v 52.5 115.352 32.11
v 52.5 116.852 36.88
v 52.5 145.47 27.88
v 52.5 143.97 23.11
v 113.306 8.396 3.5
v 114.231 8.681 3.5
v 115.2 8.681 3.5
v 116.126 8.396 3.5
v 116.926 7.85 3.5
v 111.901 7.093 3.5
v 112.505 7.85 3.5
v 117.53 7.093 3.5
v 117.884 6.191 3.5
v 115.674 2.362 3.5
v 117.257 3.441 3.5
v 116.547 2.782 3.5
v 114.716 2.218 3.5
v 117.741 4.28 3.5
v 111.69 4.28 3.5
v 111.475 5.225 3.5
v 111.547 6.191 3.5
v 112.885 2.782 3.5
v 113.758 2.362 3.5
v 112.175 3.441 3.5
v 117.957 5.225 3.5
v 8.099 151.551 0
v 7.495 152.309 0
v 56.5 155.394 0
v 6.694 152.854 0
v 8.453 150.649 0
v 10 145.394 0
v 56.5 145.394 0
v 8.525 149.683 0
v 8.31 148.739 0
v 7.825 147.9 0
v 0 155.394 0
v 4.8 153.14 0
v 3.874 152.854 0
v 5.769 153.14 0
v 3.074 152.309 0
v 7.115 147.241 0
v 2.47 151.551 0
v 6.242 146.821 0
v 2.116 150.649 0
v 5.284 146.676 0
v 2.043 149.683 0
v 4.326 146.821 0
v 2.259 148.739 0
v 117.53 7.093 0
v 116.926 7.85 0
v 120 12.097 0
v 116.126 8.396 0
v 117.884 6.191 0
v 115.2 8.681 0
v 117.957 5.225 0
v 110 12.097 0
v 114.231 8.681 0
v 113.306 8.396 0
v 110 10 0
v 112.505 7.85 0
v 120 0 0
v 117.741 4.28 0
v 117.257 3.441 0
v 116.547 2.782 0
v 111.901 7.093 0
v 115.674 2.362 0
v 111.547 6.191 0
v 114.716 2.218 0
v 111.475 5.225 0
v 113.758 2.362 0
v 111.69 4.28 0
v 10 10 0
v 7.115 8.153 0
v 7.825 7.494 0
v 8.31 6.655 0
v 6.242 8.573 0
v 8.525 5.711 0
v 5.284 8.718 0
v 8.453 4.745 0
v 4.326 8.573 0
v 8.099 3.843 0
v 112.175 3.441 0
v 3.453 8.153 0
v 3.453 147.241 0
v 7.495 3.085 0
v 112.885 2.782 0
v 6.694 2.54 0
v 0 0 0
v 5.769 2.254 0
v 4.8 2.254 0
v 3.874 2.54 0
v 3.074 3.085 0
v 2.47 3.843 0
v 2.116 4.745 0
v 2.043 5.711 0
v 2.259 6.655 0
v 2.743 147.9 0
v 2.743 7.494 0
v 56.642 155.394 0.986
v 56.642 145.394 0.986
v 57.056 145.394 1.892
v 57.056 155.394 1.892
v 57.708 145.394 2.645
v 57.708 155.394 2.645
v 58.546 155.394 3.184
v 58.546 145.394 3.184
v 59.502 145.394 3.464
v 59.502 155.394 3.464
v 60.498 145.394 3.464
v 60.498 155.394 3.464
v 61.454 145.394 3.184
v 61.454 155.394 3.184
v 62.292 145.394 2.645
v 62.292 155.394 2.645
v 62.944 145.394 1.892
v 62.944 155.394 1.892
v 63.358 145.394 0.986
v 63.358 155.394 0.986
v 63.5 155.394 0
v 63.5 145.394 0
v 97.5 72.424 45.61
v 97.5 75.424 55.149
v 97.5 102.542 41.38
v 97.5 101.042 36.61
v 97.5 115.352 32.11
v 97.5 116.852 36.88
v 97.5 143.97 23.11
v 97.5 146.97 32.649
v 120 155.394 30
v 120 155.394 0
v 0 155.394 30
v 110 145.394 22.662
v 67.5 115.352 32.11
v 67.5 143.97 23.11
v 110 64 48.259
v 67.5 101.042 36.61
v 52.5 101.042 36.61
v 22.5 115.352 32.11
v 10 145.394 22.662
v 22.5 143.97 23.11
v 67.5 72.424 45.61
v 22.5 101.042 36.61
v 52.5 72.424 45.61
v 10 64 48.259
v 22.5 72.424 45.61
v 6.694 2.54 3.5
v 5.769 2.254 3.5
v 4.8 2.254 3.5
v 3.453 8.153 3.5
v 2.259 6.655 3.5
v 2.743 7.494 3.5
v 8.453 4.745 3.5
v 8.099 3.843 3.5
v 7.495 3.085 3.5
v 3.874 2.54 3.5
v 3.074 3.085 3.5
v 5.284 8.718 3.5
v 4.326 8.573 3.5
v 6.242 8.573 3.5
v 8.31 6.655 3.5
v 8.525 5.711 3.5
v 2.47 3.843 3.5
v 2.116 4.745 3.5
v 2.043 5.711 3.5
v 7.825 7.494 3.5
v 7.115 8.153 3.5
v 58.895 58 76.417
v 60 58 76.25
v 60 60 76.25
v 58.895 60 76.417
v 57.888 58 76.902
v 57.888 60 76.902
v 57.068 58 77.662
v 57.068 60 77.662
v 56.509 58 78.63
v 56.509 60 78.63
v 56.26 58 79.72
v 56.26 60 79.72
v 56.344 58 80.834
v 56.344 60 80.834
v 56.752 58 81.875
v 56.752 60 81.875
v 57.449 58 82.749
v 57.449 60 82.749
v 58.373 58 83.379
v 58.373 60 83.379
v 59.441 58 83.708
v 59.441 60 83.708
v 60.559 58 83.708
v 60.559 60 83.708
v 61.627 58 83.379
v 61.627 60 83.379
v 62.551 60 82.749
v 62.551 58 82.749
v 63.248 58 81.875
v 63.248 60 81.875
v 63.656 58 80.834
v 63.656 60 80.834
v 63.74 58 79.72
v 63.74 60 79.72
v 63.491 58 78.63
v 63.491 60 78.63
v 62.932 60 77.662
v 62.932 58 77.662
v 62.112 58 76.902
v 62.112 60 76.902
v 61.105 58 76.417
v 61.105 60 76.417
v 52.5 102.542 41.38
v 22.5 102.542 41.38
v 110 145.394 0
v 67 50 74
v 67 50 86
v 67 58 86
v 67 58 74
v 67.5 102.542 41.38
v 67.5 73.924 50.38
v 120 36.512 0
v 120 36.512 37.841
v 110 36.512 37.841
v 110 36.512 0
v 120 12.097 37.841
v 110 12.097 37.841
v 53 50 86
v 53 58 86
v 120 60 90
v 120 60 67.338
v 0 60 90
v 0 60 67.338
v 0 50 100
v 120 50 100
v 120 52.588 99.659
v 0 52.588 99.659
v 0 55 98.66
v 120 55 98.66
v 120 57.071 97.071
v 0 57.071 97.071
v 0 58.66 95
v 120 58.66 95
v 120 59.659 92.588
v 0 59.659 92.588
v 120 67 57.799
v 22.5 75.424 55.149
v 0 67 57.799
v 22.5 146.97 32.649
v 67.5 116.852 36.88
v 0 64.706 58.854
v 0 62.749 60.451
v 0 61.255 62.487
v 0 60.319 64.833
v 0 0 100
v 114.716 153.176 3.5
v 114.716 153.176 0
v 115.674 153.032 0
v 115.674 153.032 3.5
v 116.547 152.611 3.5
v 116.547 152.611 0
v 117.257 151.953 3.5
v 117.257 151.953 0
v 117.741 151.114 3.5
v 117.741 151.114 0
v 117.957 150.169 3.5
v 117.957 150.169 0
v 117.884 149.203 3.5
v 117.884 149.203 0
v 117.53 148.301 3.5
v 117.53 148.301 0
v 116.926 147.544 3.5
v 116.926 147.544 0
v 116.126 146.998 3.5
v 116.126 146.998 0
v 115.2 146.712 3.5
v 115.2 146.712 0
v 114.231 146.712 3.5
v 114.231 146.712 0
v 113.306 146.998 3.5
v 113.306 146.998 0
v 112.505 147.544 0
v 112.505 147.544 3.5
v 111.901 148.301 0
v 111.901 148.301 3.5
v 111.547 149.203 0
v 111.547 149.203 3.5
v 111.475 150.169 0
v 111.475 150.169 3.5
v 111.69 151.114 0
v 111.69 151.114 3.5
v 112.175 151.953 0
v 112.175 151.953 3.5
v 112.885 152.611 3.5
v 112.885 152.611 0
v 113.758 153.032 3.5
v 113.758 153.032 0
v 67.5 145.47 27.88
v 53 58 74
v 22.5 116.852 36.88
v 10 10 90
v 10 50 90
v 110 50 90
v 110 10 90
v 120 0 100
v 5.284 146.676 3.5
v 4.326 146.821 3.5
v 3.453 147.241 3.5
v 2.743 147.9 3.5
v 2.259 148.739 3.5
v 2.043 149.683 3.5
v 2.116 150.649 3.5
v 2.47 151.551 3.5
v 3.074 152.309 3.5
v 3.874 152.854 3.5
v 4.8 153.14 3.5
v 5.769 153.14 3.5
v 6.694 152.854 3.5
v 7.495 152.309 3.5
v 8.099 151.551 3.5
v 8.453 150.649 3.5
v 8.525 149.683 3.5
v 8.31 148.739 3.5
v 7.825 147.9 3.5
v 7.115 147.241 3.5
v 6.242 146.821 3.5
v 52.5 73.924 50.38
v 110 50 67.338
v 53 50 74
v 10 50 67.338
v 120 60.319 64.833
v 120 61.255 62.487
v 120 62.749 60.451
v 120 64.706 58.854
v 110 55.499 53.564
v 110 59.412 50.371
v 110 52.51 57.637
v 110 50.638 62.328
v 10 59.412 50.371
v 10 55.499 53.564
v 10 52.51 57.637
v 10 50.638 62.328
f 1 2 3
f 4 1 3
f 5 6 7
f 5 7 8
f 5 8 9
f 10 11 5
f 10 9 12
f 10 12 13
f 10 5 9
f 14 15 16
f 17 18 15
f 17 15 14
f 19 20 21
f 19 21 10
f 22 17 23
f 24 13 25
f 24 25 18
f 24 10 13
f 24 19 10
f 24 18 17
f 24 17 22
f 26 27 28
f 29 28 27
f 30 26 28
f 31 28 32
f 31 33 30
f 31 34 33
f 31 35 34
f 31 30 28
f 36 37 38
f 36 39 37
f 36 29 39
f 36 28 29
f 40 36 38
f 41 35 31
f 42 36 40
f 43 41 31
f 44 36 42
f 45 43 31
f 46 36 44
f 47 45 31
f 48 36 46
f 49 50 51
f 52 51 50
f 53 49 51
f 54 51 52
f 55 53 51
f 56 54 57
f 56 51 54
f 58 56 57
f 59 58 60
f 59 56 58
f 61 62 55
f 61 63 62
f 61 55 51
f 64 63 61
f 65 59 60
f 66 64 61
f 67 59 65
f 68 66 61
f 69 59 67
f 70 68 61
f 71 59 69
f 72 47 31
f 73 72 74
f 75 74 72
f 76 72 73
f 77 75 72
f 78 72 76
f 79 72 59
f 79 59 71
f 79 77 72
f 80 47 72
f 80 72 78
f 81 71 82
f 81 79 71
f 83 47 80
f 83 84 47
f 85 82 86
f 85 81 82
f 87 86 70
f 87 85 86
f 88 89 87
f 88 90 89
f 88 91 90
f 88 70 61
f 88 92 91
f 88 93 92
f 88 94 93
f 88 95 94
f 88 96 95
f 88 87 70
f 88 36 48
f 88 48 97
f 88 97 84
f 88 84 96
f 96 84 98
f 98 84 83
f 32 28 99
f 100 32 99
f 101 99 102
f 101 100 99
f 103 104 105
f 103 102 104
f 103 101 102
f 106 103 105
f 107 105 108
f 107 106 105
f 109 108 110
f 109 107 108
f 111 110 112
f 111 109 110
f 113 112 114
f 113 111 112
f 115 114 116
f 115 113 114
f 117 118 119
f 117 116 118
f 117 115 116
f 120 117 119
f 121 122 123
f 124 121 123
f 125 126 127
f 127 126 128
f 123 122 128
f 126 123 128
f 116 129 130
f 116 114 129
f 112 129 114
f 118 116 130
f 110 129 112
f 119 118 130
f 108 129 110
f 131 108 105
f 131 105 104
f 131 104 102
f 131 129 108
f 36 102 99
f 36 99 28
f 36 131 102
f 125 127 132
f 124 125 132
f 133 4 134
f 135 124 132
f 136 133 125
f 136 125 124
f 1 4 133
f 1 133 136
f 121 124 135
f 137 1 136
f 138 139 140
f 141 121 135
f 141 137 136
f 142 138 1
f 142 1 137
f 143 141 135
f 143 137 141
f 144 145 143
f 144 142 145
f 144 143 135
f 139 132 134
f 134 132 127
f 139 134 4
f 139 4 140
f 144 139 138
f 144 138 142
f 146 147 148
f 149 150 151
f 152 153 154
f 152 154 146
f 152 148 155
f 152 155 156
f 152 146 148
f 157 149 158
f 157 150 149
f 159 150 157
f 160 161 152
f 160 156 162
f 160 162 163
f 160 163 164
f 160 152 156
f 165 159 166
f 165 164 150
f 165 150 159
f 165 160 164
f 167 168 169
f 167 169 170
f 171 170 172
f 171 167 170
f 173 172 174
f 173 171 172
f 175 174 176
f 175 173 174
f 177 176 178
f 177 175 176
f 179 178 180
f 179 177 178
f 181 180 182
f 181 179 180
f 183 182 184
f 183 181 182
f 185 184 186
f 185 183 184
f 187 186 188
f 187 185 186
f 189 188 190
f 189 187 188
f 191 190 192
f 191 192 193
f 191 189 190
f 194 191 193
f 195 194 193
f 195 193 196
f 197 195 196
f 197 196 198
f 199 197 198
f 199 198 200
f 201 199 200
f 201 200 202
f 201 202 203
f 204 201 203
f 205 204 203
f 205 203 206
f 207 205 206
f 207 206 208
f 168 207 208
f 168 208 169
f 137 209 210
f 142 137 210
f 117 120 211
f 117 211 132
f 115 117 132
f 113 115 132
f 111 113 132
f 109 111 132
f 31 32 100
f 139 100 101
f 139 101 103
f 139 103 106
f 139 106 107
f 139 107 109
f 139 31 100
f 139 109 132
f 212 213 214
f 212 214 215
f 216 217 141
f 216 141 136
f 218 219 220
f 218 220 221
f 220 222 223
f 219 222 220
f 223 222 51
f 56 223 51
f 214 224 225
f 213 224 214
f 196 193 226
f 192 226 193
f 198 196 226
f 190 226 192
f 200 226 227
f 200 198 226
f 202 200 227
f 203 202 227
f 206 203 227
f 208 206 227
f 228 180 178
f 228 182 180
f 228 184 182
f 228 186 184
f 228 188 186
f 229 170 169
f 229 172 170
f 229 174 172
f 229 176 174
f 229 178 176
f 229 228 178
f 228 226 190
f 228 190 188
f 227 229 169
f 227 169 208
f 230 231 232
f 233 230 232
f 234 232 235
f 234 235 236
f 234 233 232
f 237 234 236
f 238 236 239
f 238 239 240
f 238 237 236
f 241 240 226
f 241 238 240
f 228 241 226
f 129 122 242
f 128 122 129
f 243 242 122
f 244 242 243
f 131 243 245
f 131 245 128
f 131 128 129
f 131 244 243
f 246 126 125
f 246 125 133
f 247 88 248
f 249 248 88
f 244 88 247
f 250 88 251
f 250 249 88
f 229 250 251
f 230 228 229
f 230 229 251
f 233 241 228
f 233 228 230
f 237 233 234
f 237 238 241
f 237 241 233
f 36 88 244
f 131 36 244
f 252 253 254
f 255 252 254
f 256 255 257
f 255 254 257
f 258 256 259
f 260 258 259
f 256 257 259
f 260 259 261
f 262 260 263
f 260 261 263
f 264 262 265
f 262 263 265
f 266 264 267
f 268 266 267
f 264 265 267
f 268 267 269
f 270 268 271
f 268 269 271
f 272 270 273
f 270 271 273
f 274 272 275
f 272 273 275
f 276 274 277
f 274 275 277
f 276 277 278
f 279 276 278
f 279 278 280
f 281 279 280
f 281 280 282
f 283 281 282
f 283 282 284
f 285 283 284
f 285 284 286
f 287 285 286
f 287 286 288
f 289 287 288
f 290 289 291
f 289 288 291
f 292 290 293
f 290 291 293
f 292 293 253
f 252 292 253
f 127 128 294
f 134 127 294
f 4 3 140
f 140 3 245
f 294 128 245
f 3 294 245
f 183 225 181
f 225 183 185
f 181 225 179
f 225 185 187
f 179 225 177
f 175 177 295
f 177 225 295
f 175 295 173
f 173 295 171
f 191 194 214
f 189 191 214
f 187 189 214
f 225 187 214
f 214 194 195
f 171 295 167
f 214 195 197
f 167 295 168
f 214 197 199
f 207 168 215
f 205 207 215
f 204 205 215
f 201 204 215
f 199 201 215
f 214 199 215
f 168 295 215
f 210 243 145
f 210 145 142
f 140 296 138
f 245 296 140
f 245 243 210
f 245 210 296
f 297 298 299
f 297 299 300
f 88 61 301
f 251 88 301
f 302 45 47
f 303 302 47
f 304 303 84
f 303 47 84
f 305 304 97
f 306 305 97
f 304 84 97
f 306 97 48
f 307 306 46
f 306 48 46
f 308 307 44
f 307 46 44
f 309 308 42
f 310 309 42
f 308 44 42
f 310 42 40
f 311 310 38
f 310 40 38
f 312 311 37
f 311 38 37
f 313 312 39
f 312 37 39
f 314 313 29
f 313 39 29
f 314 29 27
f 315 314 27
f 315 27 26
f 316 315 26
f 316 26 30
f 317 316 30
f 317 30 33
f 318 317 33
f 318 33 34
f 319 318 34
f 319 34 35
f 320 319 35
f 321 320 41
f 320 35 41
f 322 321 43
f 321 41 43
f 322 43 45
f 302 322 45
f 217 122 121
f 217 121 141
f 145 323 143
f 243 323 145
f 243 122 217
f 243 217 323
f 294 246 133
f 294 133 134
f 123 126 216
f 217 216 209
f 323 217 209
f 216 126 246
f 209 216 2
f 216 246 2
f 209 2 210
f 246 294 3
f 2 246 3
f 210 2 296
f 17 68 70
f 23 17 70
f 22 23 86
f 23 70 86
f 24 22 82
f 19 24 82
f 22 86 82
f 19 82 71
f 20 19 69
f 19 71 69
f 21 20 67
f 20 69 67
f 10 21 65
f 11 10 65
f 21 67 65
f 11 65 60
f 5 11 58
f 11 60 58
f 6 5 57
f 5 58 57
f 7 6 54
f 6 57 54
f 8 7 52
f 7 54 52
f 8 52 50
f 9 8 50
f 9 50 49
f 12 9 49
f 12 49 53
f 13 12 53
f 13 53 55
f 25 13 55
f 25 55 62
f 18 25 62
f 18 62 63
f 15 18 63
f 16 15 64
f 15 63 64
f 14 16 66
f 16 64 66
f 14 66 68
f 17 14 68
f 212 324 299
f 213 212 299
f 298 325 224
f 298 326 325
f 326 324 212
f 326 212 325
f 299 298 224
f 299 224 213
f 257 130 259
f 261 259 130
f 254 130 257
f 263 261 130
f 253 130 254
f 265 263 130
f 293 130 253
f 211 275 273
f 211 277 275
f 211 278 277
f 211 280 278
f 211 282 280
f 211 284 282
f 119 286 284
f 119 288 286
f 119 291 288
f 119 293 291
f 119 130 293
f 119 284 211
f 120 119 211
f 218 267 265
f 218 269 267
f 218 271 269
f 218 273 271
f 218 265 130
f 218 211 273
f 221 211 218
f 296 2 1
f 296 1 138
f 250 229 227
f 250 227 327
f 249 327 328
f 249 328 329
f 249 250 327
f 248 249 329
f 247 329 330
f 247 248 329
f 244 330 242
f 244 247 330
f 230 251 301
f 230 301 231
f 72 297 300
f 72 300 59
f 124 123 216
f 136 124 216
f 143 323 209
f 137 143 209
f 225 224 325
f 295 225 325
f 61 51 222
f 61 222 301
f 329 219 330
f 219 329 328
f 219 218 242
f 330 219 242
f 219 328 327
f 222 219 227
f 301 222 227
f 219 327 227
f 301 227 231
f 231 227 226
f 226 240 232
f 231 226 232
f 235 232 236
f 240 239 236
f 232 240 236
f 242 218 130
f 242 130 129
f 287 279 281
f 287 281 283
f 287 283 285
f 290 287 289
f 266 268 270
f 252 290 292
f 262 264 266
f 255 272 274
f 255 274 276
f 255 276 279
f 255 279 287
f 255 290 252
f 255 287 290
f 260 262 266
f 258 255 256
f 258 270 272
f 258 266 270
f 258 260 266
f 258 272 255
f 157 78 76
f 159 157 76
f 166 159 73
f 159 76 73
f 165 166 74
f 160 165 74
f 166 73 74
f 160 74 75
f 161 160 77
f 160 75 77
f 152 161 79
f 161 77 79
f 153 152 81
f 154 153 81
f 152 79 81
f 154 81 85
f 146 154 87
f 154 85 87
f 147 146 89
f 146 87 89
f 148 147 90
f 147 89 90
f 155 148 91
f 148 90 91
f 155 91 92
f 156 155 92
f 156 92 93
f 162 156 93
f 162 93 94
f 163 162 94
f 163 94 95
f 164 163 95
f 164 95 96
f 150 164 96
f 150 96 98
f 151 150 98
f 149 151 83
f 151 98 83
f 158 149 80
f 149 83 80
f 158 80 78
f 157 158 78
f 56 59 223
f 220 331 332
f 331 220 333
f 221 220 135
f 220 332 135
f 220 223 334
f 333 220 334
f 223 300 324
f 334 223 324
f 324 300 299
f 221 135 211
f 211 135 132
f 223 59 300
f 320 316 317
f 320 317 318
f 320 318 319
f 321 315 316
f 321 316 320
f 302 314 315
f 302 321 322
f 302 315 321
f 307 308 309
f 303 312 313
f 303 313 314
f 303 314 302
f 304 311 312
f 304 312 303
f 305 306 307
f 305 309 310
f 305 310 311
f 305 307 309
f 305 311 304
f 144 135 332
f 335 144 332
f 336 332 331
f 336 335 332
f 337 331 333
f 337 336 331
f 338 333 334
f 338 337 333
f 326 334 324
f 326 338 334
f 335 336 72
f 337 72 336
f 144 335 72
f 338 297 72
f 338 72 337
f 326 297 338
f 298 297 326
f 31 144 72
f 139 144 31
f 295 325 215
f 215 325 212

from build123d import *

# Parameters (mm, degrees)
BOSS_EXTRU_1_DEPTH      = 120
COQUE1_START            = 10
COQUE1_DEPTH            = 100
ESQUISSE3_W             = 75
ESQUISSE3_H             = 75
ENL_V_MAT_EXTRU_1_DEPTH = 5
ENL_V_MAT_EXTRU_2_REACH = 194.855
ESQUISSE4_W             = 30
ESQUISSE4_H             = 30
ESQUISSE5_R             = 3.25
ENL_V_MAT_EXTRU_3_DEPTH = 3.5
ENL_V_START             = 50
ESQUISSE6_R             = 3.75
ENL_V_MAT_EXTRU_4_DEPTH = 10
ESQUISSE7_W             = 14
ESQUISSE7_H             = 12
ENL_V_MAT_EXTRU_5_DEPTH = 8
ESQUISSE8_W             = 37.840944821
ESQUISSE8_H             = 24.41449918
ENL_V_MAT_EXTRU_6_DEPTH = 10
ENL_V_START_2           = 145.39392
ESQUISSE9_R             = 3.5
ENL_V_MAT_EXTRU_8_DEPTH = 25


# Read off the part's stored shape, not the designer's step: Coque1
with BuildPart() as part:
    # Esquisse1 → Boss.-Extru.1 (new body)
    with BuildSketch(Plane(origin=(0, 0, 0), x_dir=(0, 0, -1), z_dir=(1, 0, 0))):
        with BuildLine():
            Line((0, 0), (-100, 0))
            Line((-100, 0), (-100, 50))
            ThreePointArc((-100, 50), (-97.071067812, 57.071067812), (-90, 60))
            Line((-90, 60), (-67.337993857, 60))
            ThreePointArc((-67.337993857, 60), (-61.421914074, 61.937742252), (-57.798601843, 67))
            Line((-57.798601843, 67), (-30, 155.393920142))
            Line((-30, 155.393920142), (0, 155.393920142))
            Line((0, 155.393920142), (0, 0))
        make_face()
    extrude(amount=BOSS_EXTRU_1_DEPTH)

    # Coque1 outline → Coque1 (cut)
    with BuildSketch(Plane.YZ.offset(COQUE1_START)):
        with BuildLine():
            Line((145.393920142, 0), (145.393920142, 22.662006143))
            Line((145.393920142, 22.662006143), (64, 48.259209829))
            ThreePointArc((64, 48.259209829), (53.875484503, 55.505834291), (50, 67.337993857))
            Line((50, 67.337993857), (50, 90))
            Line((50, 90), (10, 90))
            Line((10, 90), (10, 0))
            Line((10, 0), (145.393920142, 0))
        make_face()
    extrude(amount=COQUE1_DEPTH, mode=Mode.SUBTRACT)

    # Esquisse3 → Enlèv. mat.-Extru.1 (cut)
    with BuildSketch(Plane(origin=(0, 22.570905626, 71.770905626), x_dir=(-1, 0, 0), z_dir=(0, -0.3000000000000002, -0.9539392014169457))):
        with Locations((-60, 92.905349014)):
            Rectangle(ESQUISSE3_W, ESQUISSE3_H)
    extrude(amount=ENL_V_MAT_EXTRU_1_DEPTH, mode=Mode.SUBTRACT)

    # Esquisse4 → Enlèv. mat.-Extru.2 (cut, up to next)
    with BuildSketch(Plane(origin=(0, 22.570905626, 71.770905626), x_dir=(-1, 0, 0), z_dir=(0, -0.3000000000000002, -0.9539392014169457)), mode=Mode.PRIVATE) as enl_v_mat_extru_2_sk1:
        with Locations((-37.5, 115.405349014)):
            Rectangle(ESQUISSE4_W, ESQUISSE4_H)
    enl_v_mat_extru_2_tool1 = extrude(enl_v_mat_extru_2_sk1.sketch, amount=ENL_V_MAT_EXTRU_2_REACH, mode=Mode.PRIVATE) & part.part
    # Esquisse4 → Enlèv. mat.-Extru.2 (cut, up to next)
    with BuildSketch(Plane(origin=(0, 22.570905626, 71.770905626), x_dir=(-1, 0, 0), z_dir=(0, -0.3000000000000002, -0.9539392014169457)), mode=Mode.PRIVATE) as enl_v_mat_extru_2_sk2:
        with Locations((-37.5, 70.405349014)):
            Rectangle(ESQUISSE4_W, ESQUISSE4_H)
    enl_v_mat_extru_2_tool2 = extrude(enl_v_mat_extru_2_sk2.sketch, amount=ENL_V_MAT_EXTRU_2_REACH, mode=Mode.PRIVATE) & part.part
    # Esquisse4 → Enlèv. mat.-Extru.2 (cut, up to next)
    with BuildSketch(Plane(origin=(0, 22.570905626, 71.770905626), x_dir=(-1, 0, 0), z_dir=(0, -0.3000000000000002, -0.9539392014169457)), mode=Mode.PRIVATE) as enl_v_mat_extru_2_sk3:
        with Locations((-82.5, 115.405349014)):
            Rectangle(ESQUISSE4_W, ESQUISSE4_H)
    enl_v_mat_extru_2_tool3 = extrude(enl_v_mat_extru_2_sk3.sketch, amount=ENL_V_MAT_EXTRU_2_REACH, mode=Mode.PRIVATE) & part.part
    # Esquisse4 → Enlèv. mat.-Extru.2 (cut, up to next)
    with BuildSketch(Plane(origin=(0, 22.570905626, 71.770905626), x_dir=(-1, 0, 0), z_dir=(0, -0.3000000000000002, -0.9539392014169457)), mode=Mode.PRIVATE) as enl_v_mat_extru_2_sk4:
        with Locations((-82.5, 70.405349014)):
            Rectangle(ESQUISSE4_W, ESQUISSE4_H)
    enl_v_mat_extru_2_tool4 = extrude(enl_v_mat_extru_2_sk4.sketch, amount=ENL_V_MAT_EXTRU_2_REACH, mode=Mode.PRIVATE) & part.part
    add(enl_v_mat_extru_2_tool1.solids().sort_by_distance((37.5, 132.660592, 37.149301))[0], mode=Mode.SUBTRACT)
    add(enl_v_mat_extru_2_tool2.solids().sort_by_distance((37.5, 89.733328, 50.649301))[0], mode=Mode.SUBTRACT)
    add(enl_v_mat_extru_2_tool3.solids().sort_by_distance((82.5, 132.660592, 37.149301))[0], mode=Mode.SUBTRACT)
    add(enl_v_mat_extru_2_tool4.solids().sort_by_distance((82.5, 89.733328, 50.649301))[0], mode=Mode.SUBTRACT)

    # Esquisse5 → Enlèv. mat.-Extru.3 (cut)
    with BuildSketch(Plane(origin=(0, 0, 0), x_dir=(-1, 0, 0), z_dir=(0, 0, -1))):
        with Locations(Location((-114.715748307, 149.926194797, 0), (0, 0, 90))):
            Circle(ESQUISSE5_R)
        with Locations(Location((-5.284251693, 149.926194797, 0), (0, 0, 270))):
            Circle(ESQUISSE5_R)
        with Locations(Location((-5.284251693, 5.467725345, 0), (0, 0, 90))):
            Circle(ESQUISSE5_R)
        with Locations(Location((-114.715748307, 5.467725345, 0), (0, 0, 270))):
            Circle(ESQUISSE5_R)
    extrude(amount=-ENL_V_MAT_EXTRU_3_DEPTH, mode=Mode.SUBTRACT)

    # Esquisse6 → Enlèv. mat.-Extru.4 (cut)
    with BuildSketch(Plane(origin=(0, 0, 0), x_dir=(1, 0, 0), z_dir=(0, 1, 0)).offset(ENL_V_START)):
        with Locations(Location((60, -80, 0), (0, 0, 90))):
            Circle(ESQUISSE6_R)
    extrude(amount=ENL_V_MAT_EXTRU_4_DEPTH, mode=Mode.SUBTRACT)

    # Esquisse7 → Enlèv. mat.-Extru.5 (cut)
    with BuildSketch(Plane(origin=(0, 0, 0), x_dir=(1, 0, 0), z_dir=(0, 1, 0)).offset(ENL_V_START)):
        with Locations((60, -80)):
            Rectangle(ESQUISSE7_W, ESQUISSE7_H)
    extrude(amount=ENL_V_MAT_EXTRU_5_DEPTH, mode=Mode.SUBTRACT)

    # Esquisse8 → Enlèv. mat.-Extru.6 (cut)
    with BuildSketch(Plane(origin=(120, 0, 0), x_dir=(0, 0, -1), z_dir=(1, 0, 0))):
        with Locations((-18.920472411, 24.304309827)):
            Rectangle(ESQUISSE8_W, ESQUISSE8_H)
    extrude(amount=-ENL_V_MAT_EXTRU_6_DEPTH, mode=Mode.SUBTRACT)

    # Esquisse9 → Enlèv. mat.-Extru.8 (cut)
    with BuildSketch(Plane(origin=(0, 0, 0), x_dir=(1, 0, 0), z_dir=(0, 1, 0)).offset(ENL_V_START_2)):
        with Locations((60, 0)):
            Circle(ESQUISSE9_R)
    extrude(amount=ENL_V_MAT_EXTRU_8_DEPTH, mode=Mode.SUBTRACT)


solid = part.part
